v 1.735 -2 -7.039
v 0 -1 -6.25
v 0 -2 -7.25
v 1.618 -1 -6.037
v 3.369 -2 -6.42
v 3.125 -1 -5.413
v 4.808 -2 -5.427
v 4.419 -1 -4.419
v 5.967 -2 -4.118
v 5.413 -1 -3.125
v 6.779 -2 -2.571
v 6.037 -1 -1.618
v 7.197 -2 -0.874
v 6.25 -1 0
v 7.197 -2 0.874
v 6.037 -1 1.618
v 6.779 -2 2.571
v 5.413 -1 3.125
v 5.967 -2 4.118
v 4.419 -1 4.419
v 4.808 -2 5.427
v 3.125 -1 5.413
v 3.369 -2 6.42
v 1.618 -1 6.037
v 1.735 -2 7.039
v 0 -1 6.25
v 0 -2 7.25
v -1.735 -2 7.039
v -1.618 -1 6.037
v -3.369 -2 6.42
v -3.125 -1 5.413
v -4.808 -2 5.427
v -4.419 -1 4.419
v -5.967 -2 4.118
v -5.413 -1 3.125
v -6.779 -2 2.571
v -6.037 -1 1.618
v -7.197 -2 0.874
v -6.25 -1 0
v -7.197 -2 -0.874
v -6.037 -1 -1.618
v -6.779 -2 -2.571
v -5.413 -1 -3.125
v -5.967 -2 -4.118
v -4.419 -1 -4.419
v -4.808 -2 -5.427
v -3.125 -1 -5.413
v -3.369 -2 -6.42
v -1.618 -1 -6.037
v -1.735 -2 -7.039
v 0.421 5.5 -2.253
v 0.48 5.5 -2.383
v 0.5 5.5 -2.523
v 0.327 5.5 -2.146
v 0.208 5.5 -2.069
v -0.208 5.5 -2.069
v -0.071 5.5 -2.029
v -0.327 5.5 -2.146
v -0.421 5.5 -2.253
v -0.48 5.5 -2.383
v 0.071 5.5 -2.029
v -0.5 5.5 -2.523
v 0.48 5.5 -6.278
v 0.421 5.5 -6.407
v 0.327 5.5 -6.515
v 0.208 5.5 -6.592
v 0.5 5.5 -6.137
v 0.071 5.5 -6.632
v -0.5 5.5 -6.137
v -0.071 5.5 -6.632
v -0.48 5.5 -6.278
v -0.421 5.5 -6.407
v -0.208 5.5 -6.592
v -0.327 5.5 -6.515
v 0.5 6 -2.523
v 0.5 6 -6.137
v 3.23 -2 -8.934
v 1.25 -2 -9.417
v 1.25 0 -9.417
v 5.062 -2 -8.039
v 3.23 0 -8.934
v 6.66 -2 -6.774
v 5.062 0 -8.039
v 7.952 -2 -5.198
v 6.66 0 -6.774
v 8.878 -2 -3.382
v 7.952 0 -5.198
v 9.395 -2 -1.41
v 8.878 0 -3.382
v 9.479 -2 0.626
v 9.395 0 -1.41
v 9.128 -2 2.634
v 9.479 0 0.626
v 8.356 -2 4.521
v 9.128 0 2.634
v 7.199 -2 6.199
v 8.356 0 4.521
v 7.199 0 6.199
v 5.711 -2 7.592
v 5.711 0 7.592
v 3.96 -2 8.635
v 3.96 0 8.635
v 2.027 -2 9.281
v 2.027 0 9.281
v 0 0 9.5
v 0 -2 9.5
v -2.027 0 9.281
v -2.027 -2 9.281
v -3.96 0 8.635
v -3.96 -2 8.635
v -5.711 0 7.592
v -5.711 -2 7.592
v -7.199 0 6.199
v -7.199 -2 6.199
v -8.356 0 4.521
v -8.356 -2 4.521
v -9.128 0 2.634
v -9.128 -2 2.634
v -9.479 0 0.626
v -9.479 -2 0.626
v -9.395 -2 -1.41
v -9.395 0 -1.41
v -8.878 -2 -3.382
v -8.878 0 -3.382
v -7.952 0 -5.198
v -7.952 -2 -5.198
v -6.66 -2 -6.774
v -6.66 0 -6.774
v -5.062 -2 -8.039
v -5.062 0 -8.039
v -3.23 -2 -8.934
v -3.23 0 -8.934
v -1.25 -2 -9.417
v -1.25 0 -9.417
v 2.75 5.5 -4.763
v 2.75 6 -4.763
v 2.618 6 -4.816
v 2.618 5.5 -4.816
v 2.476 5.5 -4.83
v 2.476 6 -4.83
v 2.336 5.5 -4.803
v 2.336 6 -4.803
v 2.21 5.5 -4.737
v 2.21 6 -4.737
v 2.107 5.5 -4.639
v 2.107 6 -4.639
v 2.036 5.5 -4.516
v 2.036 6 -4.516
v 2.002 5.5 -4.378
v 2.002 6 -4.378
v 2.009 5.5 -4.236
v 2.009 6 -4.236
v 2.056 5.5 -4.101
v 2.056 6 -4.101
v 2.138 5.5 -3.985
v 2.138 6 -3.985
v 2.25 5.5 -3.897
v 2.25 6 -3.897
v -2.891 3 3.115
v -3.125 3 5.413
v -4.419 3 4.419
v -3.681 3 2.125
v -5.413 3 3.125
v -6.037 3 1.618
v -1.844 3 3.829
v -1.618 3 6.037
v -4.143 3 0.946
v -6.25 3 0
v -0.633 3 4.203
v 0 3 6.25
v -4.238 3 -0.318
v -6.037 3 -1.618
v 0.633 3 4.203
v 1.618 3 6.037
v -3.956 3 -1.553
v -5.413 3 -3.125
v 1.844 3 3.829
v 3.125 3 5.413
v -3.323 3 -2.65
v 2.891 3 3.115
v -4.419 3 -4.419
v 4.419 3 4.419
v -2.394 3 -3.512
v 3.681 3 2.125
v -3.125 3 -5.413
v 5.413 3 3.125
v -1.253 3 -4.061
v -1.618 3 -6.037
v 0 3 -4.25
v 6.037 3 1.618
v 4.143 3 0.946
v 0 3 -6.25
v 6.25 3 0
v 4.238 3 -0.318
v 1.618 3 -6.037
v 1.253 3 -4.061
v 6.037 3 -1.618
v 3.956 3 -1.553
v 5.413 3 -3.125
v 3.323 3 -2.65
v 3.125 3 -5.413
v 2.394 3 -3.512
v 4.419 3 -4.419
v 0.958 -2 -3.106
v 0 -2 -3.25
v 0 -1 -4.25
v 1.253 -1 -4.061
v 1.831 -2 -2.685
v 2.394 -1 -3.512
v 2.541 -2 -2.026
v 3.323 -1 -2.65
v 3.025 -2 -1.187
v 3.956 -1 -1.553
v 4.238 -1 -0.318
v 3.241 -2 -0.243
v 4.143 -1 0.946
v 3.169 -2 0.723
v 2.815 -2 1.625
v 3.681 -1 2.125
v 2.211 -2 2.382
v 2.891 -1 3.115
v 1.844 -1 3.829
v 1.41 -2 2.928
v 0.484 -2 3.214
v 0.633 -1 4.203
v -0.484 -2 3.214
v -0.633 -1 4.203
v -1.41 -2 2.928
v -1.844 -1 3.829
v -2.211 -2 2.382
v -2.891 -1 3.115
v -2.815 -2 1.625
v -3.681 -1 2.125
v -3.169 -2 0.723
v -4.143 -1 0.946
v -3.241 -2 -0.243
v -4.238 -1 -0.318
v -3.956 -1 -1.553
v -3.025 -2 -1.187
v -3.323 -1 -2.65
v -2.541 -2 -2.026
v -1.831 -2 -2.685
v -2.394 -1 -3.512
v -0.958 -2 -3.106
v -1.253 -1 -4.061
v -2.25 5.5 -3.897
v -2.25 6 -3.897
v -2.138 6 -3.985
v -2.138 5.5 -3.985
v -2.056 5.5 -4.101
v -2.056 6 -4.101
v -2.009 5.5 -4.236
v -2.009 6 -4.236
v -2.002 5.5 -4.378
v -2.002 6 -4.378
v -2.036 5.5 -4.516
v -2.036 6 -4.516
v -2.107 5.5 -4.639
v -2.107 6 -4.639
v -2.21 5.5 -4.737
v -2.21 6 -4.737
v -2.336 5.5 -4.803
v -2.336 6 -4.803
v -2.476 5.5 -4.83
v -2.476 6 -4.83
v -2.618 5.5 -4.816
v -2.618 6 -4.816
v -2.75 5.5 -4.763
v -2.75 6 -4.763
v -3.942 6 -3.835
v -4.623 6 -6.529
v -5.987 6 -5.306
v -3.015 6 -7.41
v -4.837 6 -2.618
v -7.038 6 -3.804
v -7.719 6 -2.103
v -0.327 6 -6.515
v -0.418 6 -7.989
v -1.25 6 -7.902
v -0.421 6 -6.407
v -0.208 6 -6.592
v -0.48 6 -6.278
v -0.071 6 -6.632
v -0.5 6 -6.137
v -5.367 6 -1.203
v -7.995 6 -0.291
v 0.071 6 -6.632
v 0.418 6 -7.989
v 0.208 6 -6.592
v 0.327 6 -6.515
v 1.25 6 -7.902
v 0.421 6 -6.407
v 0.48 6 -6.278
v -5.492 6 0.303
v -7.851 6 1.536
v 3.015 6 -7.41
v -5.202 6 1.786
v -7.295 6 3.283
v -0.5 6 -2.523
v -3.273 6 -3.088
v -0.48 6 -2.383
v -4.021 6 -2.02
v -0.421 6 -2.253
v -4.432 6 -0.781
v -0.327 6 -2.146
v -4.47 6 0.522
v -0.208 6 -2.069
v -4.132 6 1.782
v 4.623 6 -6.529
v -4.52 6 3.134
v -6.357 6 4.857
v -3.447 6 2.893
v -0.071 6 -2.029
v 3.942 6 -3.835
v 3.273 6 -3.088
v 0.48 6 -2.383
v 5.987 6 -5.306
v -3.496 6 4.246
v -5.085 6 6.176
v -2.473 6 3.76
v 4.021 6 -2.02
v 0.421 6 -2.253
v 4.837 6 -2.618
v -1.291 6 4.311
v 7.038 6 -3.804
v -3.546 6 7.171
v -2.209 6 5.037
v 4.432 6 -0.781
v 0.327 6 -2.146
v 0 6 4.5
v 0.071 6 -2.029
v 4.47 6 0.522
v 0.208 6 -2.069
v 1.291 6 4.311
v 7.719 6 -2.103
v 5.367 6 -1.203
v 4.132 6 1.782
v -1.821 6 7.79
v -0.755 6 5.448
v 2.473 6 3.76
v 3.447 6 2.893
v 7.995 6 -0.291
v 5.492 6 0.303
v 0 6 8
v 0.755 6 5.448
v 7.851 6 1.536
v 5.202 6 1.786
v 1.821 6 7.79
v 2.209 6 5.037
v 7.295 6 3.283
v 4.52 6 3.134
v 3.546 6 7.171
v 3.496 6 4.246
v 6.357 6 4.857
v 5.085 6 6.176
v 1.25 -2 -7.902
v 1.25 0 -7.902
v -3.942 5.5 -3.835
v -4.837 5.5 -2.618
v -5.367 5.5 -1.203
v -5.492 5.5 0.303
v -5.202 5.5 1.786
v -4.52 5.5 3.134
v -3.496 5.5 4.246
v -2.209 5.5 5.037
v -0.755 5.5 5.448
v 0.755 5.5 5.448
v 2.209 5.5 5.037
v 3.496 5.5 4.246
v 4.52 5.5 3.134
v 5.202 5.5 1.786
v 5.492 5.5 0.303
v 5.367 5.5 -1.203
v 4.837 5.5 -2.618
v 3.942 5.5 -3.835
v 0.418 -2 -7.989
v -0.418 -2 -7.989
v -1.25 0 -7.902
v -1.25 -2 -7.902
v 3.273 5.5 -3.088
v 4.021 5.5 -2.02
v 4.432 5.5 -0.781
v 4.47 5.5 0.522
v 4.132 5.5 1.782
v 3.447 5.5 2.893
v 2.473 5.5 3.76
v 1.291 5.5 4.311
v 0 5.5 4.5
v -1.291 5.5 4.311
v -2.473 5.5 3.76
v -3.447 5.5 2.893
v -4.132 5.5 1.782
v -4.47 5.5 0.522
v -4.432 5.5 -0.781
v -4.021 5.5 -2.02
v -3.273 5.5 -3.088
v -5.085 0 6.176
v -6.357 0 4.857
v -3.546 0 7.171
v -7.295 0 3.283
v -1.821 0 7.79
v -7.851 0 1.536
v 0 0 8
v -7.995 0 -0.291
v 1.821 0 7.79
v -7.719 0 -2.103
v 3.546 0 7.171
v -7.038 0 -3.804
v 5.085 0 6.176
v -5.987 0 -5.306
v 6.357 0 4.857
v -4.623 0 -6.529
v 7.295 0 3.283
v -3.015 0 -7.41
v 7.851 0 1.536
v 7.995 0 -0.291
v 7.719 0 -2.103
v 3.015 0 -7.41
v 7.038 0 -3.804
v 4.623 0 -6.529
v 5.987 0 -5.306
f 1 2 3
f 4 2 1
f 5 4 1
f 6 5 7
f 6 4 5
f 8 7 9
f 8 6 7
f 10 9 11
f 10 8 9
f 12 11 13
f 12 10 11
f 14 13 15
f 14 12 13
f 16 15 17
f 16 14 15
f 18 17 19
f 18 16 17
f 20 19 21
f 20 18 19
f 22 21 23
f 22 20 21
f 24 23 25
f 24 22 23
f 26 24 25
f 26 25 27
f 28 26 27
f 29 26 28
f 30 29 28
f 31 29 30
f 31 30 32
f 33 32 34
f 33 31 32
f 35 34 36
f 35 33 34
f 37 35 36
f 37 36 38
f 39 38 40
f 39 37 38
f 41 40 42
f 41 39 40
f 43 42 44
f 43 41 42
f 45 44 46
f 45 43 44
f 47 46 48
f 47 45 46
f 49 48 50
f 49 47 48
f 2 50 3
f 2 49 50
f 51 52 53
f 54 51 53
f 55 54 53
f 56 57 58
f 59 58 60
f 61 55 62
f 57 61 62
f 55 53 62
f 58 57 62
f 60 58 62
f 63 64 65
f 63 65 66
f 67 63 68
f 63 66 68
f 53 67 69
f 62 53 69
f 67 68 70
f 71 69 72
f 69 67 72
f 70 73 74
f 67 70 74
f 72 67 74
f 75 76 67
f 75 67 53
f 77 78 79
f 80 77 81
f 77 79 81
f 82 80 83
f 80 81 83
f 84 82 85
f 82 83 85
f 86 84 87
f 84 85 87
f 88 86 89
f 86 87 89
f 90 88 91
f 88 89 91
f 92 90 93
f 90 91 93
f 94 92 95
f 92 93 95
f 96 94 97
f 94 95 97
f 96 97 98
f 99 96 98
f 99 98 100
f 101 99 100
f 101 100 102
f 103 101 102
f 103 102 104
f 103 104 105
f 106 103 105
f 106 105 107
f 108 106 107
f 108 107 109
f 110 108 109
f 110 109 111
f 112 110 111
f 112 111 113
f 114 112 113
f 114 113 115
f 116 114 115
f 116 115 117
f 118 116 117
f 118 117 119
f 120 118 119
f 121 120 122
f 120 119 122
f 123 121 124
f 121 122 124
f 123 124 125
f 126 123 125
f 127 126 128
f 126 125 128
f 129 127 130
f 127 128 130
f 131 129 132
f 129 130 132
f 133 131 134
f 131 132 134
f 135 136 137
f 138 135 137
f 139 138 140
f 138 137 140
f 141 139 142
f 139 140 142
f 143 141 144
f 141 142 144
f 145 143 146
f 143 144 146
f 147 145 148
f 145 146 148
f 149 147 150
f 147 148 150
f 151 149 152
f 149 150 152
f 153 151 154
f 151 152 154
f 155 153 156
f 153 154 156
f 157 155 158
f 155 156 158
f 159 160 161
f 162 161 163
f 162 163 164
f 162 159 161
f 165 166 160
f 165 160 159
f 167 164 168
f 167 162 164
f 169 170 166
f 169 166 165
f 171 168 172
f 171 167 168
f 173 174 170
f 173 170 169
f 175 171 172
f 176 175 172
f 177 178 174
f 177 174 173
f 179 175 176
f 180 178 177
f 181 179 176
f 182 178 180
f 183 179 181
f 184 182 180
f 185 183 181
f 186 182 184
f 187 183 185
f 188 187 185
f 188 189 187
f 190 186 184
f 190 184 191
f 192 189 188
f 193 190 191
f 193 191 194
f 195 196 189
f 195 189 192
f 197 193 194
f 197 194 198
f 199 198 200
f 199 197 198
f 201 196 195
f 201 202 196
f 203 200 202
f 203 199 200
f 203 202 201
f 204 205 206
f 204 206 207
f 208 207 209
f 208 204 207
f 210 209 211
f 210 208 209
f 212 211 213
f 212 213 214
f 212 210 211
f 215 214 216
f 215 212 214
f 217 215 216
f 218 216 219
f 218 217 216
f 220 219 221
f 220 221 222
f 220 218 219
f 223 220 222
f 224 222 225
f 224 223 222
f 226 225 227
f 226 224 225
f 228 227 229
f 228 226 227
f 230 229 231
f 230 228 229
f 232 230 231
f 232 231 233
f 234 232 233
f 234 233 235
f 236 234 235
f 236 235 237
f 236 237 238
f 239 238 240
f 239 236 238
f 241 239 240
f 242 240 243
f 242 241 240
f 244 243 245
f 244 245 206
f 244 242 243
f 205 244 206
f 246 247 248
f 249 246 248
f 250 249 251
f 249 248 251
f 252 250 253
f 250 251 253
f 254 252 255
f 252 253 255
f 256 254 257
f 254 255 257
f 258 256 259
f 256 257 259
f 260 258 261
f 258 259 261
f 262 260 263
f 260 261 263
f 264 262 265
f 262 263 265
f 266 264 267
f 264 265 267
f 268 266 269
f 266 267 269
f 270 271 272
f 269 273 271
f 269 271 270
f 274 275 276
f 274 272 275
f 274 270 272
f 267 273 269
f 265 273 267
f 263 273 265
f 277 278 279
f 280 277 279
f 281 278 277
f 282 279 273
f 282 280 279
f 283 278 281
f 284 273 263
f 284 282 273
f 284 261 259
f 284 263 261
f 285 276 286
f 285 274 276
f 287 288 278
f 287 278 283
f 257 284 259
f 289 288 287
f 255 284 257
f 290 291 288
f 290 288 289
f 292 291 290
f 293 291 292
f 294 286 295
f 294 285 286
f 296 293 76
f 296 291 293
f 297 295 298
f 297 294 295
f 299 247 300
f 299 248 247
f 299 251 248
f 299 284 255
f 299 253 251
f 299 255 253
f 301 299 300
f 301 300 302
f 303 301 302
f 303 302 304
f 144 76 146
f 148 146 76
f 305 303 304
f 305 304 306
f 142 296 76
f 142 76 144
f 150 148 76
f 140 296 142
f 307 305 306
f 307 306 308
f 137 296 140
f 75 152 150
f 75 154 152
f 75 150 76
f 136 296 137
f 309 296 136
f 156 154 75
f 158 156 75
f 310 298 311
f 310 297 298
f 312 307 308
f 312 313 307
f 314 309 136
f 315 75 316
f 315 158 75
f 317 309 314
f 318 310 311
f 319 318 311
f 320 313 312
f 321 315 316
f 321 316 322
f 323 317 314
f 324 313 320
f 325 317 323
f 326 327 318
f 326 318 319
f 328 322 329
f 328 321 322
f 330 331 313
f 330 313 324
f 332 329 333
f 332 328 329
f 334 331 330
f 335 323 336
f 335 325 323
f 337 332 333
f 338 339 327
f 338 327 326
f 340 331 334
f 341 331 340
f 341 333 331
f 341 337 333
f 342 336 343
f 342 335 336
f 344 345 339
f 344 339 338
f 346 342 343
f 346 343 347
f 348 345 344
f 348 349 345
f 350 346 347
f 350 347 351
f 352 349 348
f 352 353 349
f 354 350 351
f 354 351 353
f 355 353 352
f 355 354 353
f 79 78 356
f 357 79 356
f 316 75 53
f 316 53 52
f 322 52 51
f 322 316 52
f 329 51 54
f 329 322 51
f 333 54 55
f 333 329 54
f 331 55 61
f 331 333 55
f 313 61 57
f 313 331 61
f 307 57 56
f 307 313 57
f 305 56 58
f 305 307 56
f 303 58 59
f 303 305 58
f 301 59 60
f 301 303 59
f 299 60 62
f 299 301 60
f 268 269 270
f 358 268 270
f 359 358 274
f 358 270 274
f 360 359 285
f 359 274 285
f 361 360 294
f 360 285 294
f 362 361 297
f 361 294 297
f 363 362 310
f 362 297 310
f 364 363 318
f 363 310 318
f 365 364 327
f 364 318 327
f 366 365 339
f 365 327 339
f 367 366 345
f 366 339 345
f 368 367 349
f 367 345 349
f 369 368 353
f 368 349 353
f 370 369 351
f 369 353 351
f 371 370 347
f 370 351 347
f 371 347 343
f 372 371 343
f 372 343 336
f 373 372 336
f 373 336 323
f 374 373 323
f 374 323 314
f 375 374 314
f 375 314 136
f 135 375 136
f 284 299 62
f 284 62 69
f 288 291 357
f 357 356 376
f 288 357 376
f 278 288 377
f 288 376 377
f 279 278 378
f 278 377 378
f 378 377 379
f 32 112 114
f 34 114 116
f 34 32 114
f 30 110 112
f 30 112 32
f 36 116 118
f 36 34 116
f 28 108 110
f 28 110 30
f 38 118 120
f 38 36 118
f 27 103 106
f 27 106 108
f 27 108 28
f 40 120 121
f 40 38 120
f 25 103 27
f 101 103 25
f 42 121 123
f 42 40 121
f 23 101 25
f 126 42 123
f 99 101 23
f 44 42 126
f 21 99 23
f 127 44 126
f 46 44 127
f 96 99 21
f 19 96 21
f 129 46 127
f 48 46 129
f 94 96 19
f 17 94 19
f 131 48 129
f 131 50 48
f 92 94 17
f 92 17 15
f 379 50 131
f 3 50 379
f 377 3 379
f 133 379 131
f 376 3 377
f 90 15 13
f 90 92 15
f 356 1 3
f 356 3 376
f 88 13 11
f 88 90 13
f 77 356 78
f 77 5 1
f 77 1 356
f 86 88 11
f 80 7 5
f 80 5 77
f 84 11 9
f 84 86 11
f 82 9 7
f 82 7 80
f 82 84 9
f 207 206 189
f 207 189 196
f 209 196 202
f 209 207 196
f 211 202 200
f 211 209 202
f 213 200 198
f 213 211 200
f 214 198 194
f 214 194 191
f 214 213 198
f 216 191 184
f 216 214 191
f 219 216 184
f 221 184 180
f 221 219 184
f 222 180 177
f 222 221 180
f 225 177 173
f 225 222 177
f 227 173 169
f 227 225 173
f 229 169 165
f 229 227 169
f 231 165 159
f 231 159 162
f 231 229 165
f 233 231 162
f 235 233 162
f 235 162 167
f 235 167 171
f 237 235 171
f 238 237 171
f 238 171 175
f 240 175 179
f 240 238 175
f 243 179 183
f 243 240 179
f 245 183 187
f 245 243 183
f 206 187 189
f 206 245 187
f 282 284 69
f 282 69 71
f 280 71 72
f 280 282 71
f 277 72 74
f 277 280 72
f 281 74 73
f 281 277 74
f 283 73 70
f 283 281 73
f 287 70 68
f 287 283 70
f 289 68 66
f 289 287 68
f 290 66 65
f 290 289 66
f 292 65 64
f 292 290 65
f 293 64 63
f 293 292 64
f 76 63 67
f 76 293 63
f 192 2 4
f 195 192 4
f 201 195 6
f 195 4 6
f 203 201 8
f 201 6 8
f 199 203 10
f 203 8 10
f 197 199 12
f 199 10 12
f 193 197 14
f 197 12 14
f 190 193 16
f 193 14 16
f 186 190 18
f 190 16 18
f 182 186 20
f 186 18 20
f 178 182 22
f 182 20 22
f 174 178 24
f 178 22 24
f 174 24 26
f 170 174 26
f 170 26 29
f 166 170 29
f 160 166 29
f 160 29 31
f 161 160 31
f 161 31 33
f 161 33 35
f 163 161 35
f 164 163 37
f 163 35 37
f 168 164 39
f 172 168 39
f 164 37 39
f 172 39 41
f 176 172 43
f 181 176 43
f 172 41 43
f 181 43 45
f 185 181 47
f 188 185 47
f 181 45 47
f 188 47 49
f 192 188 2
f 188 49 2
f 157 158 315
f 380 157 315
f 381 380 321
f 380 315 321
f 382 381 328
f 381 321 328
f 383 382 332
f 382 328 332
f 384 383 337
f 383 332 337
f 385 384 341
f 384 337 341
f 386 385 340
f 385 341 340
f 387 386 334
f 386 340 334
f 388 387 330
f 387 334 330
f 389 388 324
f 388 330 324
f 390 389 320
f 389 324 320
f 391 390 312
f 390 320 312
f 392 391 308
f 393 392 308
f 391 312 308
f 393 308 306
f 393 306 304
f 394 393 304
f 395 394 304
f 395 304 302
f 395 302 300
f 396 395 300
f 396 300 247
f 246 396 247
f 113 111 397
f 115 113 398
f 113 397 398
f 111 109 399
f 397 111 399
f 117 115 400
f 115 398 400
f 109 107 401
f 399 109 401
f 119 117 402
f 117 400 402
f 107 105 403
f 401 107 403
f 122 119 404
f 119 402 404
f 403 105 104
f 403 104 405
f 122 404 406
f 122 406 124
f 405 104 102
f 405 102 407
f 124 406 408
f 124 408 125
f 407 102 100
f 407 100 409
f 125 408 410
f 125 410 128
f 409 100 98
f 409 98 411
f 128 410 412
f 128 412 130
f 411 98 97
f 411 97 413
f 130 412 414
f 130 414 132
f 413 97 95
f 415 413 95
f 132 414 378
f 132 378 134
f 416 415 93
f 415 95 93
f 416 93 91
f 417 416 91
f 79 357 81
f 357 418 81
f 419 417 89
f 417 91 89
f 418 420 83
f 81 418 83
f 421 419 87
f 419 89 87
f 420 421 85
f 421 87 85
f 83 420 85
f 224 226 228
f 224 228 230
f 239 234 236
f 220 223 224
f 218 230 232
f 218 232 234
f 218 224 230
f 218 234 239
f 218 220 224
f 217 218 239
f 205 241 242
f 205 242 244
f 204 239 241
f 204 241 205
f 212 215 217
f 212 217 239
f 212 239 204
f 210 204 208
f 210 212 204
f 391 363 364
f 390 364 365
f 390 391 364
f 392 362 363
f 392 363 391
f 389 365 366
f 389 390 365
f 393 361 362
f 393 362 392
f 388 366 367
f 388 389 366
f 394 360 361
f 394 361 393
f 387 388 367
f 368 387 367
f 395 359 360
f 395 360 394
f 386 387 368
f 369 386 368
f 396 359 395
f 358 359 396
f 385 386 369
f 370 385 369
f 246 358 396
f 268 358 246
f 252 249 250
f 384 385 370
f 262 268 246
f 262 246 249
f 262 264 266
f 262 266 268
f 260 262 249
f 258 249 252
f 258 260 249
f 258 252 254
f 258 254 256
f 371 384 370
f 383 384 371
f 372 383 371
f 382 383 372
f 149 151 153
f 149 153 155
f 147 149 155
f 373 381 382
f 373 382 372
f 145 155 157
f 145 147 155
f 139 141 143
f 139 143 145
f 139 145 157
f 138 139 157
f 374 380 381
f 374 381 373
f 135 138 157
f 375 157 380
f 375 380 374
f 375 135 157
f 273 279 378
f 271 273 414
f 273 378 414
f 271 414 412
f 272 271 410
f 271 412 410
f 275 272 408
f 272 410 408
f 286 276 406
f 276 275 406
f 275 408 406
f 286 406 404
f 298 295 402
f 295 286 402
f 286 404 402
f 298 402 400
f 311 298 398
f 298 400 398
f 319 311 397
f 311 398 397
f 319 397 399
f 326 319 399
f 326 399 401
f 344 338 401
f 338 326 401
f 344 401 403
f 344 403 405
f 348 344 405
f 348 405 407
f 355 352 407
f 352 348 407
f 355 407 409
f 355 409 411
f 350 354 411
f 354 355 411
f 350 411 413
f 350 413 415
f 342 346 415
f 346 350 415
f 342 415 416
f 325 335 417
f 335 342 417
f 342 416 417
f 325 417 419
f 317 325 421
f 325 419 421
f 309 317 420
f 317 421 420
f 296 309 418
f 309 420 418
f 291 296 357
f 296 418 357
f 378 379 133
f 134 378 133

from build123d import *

# Parameters (mm, degrees)
SKETCH1_R           = 8
BOSS_EXTRUDE1_DEPTH = 6
SKETCH2_R           = 9.5
BOSS_EXTRUDE2_DEPTH = 2
SKETCH3_R           = 6.25
SKETCH3_R_2         = 4.25
CUT_EXTRUDE1_DEPTH  = 5
CHAMFER1_SIZE       = 1
CHAMFER2_SIZE       = 1
CUT_EXTRUDE2_DEPTH  = 16.636495771
CUT_EXTRUDE3_DEPTH  = 0.5


with BuildPart() as part:
    # Sketch1 → Boss-Extrude1 (new body)
    with BuildSketch(Plane(origin=(0, 0, 0), x_dir=(1, 0, 0), z_dir=(0, 1, 0))):
        with Locations(Location((0, 0, 0), (0, 0, 270))):
            Circle(SKETCH1_R)
    extrude(amount=BOSS_EXTRUDE1_DEPTH)

    # Sketch2 → Boss-Extrude2 (add)
    with BuildSketch(Plane.XZ):
        with Locations(Location((0, 0, 0), (0, 0, 270))):
            Circle(SKETCH2_R)
    extrude(amount=BOSS_EXTRUDE2_DEPTH)

    # Sketch3 → Cut-Extrude1 (cut)
    with BuildSketch(Plane.XZ.offset(2)):
        with Locations(Location((0, 0, 0), (0, 0, 270))):
            Circle(SKETCH3_R)
        with Locations(Location((0, 0, 0), (0, 0, 270))):
            Circle(SKETCH3_R_2, mode=Mode.SUBTRACT)
    extrude(amount=-CUT_EXTRUDE1_DEPTH, mode=Mode.SUBTRACT)

    # Chamfer1
    chamfer1_edges = [part.edges().sort_by_distance(p)[0] for p in [
        (0, -2, 6.25),
    ]]
    chamfer(chamfer1_edges, length=CHAMFER1_SIZE)

    # Chamfer2
    chamfer2_edges = [part.edges().sort_by_distance(p)[0] for p in [
        (0, -2, 4.25),
    ]]
    chamfer(chamfer2_edges, length=CHAMFER2_SIZE)

    # Sketch5 → Cut-Extrude2 (cut, through all)
    with BuildSketch(Plane.XZ.offset(2)):
        with BuildLine():
            Line((-1.25, -16.547716643), (1.25, -16.547716643))
            Line((1.25, -16.547716643), (1.25, -7.901740315))
            ThreePointArc((1.25, -7.901740315), (0, -8), (-1.25, -7.901740315))
            Line((-1.25, -7.901740315), (-1.25, -16.547716643))
        make_face()
    extrude(amount=-CUT_EXTRUDE2_DEPTH, mode=Mode.SUBTRACT)

    # Sketch6 → Cut-Extrude3 (cut)
    with BuildSketch(Plane(origin=(0, 6, 0), x_dir=(1, 0, 0), z_dir=(0, 1, 0))):
        with BuildLine():
            Line((0.5, 6.136828952), (0.5, 2.523425086))
            ThreePointArc((0.5, 2.523425086), (0, 2.023425086), (-0.5, 2.523425086))
            Line((-0.5, 2.523425086), (-0.5, 6.136828952))
            ThreePointArc((-0.5, 6.136828952), (0, 6.636828952), (0.5, 6.136828952))
        make_face()
        with BuildLine():
            ThreePointArc((-2.75, 4.763139721), (0, -5.5), (2.75, 4.763139721))
            ThreePointArc((2.75, 4.763139721), (2.066987298, 4.580127019), (2.25, 3.897114317))
            ThreePointArc((2.25, 3.897114317), (0, -4.5), (-2.25, 3.897114317))
            ThreePointArc((-2.25, 3.897114317), (-2.066987298, 4.580127019), (-2.75, 4.763139721))
        make_face()
    extrude(amount=-CUT_EXTRUDE3_DEPTH, mode=Mode.SUBTRACT)


solid = part.part
